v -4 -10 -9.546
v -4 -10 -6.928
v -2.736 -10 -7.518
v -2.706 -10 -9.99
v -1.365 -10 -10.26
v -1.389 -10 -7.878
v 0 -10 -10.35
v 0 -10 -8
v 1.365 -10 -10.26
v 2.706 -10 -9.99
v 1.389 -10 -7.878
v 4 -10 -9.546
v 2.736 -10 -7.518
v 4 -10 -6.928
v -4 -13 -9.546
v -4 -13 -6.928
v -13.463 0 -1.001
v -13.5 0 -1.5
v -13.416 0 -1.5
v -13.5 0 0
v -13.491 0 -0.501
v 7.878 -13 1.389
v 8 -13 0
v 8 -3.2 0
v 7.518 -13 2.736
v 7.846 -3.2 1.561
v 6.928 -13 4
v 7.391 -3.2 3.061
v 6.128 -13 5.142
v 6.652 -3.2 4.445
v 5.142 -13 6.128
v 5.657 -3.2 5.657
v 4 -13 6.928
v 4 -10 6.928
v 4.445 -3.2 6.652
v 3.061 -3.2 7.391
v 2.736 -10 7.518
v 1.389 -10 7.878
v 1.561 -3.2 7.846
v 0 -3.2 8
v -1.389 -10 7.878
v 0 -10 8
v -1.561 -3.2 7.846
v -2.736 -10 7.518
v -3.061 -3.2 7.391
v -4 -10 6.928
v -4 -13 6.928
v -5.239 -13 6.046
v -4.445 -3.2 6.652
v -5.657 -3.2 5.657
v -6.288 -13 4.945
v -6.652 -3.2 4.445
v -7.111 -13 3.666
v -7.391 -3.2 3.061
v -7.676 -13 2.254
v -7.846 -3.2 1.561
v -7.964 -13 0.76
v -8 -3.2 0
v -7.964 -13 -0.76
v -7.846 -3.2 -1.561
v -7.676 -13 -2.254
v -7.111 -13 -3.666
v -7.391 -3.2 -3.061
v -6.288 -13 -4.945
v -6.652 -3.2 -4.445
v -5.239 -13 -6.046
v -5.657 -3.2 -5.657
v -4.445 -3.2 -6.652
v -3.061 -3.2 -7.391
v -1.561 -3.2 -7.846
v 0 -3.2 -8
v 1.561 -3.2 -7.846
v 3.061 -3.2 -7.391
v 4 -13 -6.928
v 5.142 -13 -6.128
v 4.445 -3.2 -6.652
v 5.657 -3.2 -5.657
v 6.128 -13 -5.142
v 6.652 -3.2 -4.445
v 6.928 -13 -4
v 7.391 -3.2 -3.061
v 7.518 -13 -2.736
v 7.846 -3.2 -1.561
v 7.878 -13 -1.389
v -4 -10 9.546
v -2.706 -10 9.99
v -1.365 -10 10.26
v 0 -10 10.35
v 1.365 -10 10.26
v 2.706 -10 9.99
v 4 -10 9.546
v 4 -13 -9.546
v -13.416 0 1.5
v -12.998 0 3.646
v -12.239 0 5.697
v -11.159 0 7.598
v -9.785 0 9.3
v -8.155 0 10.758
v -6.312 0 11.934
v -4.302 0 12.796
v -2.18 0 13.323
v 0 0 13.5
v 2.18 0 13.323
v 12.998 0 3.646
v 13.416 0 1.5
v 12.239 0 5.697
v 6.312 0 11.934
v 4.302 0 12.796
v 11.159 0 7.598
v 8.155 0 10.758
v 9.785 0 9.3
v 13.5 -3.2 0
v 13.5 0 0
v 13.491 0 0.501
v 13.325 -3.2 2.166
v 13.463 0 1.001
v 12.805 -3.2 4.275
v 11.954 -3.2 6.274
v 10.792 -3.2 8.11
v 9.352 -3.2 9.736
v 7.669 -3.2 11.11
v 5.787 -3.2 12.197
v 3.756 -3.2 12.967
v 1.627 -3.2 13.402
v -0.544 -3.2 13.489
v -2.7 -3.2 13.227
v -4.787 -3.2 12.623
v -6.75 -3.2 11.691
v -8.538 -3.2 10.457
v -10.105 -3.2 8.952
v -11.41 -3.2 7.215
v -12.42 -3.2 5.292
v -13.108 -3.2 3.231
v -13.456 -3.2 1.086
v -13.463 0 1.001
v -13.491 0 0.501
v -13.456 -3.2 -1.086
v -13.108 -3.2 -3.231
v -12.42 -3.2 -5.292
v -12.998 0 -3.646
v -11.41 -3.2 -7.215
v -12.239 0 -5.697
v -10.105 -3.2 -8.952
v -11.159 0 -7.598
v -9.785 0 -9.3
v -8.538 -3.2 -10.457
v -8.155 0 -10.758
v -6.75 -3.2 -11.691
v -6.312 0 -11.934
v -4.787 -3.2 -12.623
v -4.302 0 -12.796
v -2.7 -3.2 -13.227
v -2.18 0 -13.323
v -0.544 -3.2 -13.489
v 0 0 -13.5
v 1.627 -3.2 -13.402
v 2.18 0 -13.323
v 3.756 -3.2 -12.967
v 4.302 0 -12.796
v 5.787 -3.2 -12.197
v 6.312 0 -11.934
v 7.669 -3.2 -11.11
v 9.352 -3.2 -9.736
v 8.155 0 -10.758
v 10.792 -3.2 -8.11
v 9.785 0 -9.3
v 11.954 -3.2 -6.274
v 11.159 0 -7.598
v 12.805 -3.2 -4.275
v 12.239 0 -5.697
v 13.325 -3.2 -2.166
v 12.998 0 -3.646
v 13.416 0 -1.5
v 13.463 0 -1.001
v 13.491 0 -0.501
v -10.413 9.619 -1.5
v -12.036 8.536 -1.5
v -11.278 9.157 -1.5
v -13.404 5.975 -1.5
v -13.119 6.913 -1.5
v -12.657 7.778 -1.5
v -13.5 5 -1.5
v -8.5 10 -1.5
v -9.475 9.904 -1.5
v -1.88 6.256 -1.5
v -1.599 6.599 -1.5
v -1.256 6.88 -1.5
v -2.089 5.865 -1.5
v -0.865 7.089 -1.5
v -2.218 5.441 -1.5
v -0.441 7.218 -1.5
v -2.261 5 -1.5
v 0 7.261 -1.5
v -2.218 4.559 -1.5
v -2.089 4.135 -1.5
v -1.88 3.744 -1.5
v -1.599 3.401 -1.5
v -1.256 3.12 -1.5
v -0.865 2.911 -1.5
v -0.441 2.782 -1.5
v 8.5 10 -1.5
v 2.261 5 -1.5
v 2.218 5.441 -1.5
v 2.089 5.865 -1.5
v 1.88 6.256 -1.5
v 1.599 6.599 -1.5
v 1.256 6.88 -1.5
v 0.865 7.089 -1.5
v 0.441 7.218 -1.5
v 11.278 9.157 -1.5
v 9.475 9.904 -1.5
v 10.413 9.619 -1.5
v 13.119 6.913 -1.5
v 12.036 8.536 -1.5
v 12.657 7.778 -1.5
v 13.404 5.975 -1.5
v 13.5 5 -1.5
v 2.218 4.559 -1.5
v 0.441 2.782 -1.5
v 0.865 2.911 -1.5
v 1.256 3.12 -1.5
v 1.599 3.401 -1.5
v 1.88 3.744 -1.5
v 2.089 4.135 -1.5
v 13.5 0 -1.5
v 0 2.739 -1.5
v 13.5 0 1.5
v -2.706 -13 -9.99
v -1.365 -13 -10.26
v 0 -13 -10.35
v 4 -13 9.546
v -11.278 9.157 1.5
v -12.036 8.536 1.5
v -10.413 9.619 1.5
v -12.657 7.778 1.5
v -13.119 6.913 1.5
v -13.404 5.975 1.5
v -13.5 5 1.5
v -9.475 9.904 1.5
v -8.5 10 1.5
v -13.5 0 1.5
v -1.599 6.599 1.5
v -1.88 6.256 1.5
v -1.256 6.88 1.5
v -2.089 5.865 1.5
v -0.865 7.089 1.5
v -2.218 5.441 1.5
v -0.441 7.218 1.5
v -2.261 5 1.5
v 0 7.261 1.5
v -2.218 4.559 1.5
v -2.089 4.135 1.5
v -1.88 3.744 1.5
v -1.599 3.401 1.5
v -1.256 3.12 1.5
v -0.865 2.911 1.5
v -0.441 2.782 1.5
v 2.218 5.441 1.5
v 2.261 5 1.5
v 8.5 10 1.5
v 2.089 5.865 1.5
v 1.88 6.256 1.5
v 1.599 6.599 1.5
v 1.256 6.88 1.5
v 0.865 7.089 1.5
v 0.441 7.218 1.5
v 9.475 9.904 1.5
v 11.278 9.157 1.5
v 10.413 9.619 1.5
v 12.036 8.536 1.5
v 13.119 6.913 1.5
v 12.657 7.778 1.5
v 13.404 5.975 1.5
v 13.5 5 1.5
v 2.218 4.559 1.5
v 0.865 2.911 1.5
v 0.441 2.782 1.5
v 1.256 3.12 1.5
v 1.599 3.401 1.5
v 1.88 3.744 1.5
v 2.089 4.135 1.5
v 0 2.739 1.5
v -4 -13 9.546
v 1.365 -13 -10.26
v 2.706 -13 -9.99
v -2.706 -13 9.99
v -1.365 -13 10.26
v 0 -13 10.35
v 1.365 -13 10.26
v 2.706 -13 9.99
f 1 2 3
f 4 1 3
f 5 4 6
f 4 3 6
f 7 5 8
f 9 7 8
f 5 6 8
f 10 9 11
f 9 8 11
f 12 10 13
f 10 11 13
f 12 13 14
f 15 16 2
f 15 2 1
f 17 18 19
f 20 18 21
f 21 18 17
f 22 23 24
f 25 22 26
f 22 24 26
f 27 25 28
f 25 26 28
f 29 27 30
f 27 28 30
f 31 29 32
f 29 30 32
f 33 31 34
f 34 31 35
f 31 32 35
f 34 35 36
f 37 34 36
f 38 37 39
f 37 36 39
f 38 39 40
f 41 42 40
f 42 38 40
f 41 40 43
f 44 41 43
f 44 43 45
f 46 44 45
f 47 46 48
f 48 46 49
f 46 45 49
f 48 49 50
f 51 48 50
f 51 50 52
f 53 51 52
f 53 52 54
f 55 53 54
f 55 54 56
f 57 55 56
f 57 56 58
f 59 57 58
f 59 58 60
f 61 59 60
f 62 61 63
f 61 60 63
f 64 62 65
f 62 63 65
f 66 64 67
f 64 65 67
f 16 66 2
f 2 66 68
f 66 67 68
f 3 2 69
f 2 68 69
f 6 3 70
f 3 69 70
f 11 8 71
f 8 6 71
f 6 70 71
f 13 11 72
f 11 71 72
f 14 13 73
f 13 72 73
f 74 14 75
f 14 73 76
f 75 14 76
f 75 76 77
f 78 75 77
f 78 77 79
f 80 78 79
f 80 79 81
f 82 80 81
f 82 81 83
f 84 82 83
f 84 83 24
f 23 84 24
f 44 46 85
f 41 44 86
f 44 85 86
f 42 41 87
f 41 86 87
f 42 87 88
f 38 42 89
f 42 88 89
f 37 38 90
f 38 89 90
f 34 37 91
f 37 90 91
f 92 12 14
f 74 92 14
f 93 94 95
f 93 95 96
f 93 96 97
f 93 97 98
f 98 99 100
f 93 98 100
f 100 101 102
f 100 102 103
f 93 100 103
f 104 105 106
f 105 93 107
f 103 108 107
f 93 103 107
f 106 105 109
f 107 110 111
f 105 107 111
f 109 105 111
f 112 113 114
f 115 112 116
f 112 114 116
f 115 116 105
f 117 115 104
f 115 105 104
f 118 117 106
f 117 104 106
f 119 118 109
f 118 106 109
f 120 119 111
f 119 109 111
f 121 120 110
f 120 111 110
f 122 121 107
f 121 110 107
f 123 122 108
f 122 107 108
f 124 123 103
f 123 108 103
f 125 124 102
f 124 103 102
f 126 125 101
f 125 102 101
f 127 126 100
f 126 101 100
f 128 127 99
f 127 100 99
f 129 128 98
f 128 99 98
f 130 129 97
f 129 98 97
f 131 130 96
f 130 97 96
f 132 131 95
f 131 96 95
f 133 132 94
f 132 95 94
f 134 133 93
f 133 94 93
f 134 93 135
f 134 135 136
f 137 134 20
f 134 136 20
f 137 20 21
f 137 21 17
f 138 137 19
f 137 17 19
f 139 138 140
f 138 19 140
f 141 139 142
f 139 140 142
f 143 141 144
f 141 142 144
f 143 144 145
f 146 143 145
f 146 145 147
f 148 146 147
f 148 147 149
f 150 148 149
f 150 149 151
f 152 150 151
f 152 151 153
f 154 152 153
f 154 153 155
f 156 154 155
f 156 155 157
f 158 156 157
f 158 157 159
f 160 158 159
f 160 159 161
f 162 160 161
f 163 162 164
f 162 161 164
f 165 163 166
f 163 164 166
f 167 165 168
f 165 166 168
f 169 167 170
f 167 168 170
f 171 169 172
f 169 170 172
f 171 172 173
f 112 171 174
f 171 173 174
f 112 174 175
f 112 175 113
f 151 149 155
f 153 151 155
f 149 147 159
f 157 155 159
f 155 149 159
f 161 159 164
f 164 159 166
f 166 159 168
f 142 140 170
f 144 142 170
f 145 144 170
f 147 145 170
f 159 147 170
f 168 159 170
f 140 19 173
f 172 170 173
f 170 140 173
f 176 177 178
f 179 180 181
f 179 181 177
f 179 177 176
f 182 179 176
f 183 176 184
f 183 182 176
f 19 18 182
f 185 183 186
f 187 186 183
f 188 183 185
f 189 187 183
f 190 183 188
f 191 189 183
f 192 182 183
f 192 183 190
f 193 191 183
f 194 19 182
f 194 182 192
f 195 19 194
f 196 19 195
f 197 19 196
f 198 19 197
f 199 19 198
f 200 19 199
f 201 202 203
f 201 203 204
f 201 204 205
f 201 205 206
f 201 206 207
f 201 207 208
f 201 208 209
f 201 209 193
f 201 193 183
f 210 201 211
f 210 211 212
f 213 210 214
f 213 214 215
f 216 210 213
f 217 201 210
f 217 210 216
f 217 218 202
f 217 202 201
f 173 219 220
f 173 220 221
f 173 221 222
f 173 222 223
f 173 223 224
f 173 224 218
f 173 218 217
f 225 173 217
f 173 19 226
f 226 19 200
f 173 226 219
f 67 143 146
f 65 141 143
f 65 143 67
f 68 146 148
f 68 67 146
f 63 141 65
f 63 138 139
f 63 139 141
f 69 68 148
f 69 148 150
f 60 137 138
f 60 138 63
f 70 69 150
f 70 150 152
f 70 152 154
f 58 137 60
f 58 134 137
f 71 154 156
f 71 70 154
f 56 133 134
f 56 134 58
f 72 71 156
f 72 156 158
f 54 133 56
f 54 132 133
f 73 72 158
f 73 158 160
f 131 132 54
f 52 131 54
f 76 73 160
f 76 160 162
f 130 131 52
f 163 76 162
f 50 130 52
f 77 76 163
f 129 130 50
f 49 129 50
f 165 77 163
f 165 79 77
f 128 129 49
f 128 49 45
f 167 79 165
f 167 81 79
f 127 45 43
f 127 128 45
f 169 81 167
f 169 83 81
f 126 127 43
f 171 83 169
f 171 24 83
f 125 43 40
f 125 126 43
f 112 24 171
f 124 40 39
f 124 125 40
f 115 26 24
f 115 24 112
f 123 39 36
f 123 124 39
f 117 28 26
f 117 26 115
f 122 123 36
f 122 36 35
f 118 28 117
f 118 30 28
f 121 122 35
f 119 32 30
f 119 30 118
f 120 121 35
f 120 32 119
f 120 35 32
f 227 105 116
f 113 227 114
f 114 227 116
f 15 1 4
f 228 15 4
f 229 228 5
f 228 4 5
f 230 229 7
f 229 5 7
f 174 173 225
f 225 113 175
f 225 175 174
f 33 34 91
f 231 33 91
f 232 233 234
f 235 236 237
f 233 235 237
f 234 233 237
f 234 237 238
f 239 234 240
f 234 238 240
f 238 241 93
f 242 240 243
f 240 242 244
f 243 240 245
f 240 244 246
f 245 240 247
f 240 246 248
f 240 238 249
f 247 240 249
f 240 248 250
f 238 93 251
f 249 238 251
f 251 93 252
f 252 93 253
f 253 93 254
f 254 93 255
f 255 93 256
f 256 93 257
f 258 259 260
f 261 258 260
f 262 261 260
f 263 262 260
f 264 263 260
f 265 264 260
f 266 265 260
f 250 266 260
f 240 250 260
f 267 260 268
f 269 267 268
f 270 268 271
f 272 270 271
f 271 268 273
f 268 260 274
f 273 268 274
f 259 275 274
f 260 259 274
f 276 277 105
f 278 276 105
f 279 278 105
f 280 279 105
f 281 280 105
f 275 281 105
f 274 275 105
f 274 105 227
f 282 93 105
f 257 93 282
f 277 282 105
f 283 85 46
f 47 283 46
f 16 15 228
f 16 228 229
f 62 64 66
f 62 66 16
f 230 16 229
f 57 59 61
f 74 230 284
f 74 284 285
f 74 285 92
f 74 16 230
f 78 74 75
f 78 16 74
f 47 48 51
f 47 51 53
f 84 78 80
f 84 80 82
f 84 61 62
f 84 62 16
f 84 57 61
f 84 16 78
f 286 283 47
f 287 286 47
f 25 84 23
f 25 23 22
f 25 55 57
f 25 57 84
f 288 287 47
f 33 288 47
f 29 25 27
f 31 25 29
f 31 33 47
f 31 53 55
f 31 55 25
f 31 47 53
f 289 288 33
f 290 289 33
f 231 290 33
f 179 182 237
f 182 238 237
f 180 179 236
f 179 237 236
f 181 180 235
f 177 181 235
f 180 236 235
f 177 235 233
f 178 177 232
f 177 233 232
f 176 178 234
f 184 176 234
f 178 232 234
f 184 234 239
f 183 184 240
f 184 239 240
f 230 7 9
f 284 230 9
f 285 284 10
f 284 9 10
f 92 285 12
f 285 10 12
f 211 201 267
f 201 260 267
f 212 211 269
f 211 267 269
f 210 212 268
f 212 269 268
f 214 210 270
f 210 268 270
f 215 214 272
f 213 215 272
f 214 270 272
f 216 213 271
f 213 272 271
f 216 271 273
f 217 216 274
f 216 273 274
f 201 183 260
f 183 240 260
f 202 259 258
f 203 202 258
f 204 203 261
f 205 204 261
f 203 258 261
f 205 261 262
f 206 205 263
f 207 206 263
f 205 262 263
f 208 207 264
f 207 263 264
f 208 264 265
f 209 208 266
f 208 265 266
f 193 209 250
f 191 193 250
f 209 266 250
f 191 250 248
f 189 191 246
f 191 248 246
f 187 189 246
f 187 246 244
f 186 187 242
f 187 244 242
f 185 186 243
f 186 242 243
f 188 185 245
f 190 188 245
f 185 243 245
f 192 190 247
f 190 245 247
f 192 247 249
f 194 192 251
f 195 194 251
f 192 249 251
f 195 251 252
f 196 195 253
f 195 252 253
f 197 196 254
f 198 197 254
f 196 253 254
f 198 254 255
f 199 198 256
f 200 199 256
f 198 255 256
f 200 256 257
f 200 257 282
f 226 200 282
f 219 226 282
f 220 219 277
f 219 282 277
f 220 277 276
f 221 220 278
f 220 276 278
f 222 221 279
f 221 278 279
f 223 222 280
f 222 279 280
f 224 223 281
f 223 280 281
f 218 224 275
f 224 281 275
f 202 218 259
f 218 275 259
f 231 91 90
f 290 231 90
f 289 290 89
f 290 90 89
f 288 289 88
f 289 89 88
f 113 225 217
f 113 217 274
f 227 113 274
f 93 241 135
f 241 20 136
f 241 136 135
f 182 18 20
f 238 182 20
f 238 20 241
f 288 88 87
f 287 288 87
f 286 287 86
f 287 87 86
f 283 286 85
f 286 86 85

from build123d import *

# Parameters (mm, degrees)
F0_R      = 8
F1_DEPTH  = 13
F0_R_2    = 13.5
F2_DEPTH  = 3.2
F5_DEPTH  = 3
F6_W      = 27
F6_H      = 3
F7_DEPTH  = 10
F8_R      = 5
F9_R      = 5
F11_R     = 2.2611547592
F12_DEPTH = 3


with BuildPart() as f1:
    # F0 (on Front) → F1 (new body)
    with BuildSketch(Plane.XZ):
        Circle(F0_R)
    extrude(amount=F1_DEPTH)

    # F0 (on Front) → F2 (join)
    with BuildSketch(Plane.XZ):
        Circle(F0_R_2)
        Circle(F0_R, mode=Mode.SUBTRACT)
    extrude(amount=F2_DEPTH)

    # F4 (on offset) → F5 (join)
    with BuildSketch(Plane.XZ.offset(10)):
        with BuildLine():
            ThreePointArc((-4, -9.5458105994), (-2.040019644, -10.1469611141), (0, -10.35))
            ThreePointArc((0, -10.35), (2.040019644, -10.1469611141), (4, -9.5458105994))
            Line((4, -9.5458105994), (4, 9.5458105994))
            ThreePointArc((4, 9.5458105994), (2.040019644, 10.1469611141), (0, 10.35))
            ThreePointArc((0, 10.35), (-2.040019644, 10.1469611141), (-4, 9.5458105994))
            Line((-4, 9.5458105994), (-4, -9.5458105994))
        make_face()
    extrude(amount=F5_DEPTH)

    # F6 (on Front) → F7 (join)
    with BuildSketch(Plane.XZ):
        Rectangle(F6_W, F6_H)
    extrude(amount=-F7_DEPTH)

    # F8
    f8_edges = [f1.edges().sort_by_distance(p)[0] for p in [
        (-13.5, 10, 0),
    ]]
    fillet(f8_edges, radius=F8_R)

    # F9
    f9_edges = [f1.edges().sort_by_distance(p)[0] for p in [
        (13.5, 10, 0),
    ]]
    fillet(f9_edges, radius=F9_R)

    # F11 (on face) → F12 (cut, through all)
    with BuildSketch(Plane.XY.offset(1.5)):
        with Locations((0, 5)):
            Circle(F11_R)
    extrude(amount=-F12_DEPTH, mode=Mode.SUBTRACT)


solid = f1.part
